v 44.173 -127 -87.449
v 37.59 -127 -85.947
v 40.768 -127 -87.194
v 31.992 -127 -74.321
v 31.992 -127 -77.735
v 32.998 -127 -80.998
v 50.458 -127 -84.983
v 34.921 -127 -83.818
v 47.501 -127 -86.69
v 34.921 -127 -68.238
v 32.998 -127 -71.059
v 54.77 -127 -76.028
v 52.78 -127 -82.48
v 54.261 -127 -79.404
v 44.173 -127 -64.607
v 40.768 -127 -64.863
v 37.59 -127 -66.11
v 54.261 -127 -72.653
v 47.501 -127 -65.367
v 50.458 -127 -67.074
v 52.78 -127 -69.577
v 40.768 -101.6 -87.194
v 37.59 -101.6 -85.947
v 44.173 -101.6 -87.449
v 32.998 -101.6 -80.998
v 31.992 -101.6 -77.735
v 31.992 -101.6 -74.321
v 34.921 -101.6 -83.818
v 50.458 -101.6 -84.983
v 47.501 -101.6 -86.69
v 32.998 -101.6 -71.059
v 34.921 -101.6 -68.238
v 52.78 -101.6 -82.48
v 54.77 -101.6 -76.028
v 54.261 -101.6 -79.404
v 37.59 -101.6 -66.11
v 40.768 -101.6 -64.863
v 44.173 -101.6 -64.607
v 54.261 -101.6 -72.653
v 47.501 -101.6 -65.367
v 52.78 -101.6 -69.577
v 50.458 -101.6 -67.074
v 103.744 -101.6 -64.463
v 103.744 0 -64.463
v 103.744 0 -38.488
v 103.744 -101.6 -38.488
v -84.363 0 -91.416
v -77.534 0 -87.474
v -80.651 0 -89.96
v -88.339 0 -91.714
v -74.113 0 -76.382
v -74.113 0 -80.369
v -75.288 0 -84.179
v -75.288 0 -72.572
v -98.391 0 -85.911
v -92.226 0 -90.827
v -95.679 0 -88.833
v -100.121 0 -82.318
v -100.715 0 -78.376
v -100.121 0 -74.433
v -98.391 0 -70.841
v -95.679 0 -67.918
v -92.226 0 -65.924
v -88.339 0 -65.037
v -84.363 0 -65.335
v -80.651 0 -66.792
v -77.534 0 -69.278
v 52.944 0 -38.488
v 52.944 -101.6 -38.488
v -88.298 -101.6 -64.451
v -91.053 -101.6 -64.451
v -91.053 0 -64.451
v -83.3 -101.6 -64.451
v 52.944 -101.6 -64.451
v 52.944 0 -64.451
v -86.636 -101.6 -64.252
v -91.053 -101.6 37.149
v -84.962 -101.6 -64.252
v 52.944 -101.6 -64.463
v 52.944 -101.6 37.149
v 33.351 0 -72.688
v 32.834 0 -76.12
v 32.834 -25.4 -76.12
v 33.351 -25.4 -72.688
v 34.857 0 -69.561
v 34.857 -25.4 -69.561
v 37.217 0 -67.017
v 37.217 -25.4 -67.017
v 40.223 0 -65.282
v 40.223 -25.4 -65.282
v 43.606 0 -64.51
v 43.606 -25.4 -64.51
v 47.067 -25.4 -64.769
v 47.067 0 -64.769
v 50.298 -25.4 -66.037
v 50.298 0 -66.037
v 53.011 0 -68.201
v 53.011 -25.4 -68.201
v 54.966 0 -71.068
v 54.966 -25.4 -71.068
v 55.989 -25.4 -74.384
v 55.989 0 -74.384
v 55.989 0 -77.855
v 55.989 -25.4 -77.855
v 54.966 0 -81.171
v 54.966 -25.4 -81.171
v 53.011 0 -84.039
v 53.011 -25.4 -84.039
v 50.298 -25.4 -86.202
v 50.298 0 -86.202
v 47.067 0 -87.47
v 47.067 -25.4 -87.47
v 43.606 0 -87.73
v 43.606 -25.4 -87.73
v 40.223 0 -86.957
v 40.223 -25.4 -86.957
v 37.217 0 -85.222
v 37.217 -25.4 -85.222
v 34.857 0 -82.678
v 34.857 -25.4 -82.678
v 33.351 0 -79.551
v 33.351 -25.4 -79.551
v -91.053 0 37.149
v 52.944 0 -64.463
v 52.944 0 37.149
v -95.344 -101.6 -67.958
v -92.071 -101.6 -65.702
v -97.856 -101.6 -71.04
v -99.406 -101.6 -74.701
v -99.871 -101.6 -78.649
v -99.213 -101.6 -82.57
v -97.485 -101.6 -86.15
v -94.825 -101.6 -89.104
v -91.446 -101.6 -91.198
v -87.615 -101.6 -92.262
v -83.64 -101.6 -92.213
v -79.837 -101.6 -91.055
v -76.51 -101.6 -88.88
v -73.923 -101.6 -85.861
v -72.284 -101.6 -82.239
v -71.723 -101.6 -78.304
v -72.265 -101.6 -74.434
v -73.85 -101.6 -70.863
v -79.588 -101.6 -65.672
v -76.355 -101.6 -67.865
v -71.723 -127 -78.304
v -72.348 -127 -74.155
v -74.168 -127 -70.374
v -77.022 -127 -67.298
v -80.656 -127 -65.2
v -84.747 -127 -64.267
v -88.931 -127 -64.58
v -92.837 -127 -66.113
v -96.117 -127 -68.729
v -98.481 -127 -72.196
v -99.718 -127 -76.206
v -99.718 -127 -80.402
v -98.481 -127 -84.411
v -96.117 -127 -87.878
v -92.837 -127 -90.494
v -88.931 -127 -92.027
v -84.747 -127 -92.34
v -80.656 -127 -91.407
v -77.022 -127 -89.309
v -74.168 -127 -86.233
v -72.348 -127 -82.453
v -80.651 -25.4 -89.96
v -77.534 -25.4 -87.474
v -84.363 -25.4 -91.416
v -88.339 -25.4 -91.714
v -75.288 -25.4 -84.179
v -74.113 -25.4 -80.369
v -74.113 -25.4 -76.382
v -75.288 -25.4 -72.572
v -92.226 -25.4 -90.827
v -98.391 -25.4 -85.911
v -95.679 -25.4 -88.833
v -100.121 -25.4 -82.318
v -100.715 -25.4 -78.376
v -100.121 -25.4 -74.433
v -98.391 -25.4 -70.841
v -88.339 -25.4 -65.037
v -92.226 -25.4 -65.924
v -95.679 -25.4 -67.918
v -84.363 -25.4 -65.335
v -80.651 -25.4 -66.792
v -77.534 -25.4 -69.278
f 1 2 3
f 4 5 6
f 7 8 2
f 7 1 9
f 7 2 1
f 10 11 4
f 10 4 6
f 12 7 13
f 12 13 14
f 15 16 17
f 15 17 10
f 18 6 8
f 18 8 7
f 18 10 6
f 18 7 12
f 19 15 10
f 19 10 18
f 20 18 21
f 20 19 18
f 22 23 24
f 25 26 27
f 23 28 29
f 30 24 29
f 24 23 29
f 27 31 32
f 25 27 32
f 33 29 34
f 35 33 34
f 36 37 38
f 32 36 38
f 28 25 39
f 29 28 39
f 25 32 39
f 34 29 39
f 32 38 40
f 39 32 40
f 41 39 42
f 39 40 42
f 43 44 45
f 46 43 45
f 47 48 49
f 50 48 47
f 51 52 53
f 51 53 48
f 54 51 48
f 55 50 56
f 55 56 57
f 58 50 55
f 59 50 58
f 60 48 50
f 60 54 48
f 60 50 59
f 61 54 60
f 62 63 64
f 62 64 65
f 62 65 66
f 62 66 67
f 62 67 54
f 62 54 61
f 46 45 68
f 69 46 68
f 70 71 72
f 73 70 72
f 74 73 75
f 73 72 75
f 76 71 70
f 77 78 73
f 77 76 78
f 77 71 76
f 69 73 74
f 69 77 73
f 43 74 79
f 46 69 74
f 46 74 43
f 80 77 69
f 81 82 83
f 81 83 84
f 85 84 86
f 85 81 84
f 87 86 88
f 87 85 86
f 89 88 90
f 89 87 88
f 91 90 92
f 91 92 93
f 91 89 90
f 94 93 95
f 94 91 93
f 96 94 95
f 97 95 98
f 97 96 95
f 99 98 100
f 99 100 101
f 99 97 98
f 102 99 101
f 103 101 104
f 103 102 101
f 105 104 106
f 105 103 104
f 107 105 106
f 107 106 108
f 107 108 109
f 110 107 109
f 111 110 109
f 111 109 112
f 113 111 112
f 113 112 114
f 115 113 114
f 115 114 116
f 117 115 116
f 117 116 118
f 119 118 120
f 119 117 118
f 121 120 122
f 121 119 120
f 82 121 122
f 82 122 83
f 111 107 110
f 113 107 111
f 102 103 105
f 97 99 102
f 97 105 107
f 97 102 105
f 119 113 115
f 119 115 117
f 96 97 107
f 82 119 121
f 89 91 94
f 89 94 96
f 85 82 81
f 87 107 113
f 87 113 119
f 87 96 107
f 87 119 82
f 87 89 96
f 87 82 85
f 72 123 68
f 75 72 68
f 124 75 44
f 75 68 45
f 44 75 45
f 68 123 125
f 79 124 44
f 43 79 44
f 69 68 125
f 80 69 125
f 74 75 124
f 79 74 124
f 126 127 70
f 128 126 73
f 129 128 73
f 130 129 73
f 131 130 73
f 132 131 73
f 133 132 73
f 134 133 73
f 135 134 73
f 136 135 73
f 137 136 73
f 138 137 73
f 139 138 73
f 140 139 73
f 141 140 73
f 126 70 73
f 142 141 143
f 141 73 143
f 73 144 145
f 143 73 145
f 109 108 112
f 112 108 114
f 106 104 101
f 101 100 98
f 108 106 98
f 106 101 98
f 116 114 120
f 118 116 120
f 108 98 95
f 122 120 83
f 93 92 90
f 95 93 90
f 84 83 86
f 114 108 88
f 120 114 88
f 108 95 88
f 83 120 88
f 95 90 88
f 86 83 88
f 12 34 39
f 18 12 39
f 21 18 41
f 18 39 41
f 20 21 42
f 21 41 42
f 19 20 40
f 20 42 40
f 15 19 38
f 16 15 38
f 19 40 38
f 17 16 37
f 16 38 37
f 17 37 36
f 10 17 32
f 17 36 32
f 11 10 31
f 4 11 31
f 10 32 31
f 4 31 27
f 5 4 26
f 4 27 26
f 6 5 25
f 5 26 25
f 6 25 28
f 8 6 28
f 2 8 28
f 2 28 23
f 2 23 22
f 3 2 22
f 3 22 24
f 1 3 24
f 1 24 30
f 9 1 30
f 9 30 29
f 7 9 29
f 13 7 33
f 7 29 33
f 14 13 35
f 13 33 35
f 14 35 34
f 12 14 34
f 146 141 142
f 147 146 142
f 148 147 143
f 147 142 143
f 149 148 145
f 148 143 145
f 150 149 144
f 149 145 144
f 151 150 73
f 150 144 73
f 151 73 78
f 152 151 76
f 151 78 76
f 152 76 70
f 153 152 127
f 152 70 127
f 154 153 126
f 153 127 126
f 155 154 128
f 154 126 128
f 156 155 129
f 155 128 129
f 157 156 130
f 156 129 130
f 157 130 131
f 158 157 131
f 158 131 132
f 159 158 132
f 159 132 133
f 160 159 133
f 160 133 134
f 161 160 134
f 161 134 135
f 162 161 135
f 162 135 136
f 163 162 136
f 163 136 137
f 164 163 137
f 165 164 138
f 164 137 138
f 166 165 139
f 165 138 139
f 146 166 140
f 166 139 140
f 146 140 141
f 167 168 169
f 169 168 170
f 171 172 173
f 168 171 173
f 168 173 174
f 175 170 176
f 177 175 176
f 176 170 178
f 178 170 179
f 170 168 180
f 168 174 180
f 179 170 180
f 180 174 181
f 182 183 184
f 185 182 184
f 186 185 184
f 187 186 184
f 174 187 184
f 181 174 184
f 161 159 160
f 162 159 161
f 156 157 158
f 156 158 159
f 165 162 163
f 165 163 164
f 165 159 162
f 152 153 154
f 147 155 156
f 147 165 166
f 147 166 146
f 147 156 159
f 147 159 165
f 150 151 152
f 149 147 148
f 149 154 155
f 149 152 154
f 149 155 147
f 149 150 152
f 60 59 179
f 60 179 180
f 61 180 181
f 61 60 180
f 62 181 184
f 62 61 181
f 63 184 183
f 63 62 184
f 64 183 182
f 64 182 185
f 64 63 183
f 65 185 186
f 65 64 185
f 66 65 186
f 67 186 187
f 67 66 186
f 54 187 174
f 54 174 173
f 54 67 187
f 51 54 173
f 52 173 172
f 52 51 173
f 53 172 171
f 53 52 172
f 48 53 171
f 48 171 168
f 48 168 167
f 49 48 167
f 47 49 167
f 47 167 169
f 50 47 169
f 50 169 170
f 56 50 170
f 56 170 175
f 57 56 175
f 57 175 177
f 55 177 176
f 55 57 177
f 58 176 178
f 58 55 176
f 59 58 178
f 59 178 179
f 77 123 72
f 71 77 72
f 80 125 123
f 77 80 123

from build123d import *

# Parameters (mm, degrees)
F1_DEPTH = 101.6
F2_W     = 37.540236
F2_H     = 32.421116
F2_W_2   = 44.555331
F2_H_2   = 31.852323
F2_W_3   = 33.748291
F2_H_3   = 32.800309
F3_DEPTH = 2.54
F4_R     = 14.07623
F4_R_2   = 11.452987
F5_DEPTH = 25.4
F6_R     = 13.375894
F6_R_2   = 11.642566
F7_DEPTH = 25.4


with BuildPart() as f1:
    # F0 (on Front) → F1 (new body)
    with BuildSketch(Plane.XZ):
        Polygon((52.943984, -38.488224), (52.943984, 37.149004), (-91.053015, 37.149004), (-91.053015, -64.450996), (52.943984, -64.450996), align=None)
        Polygon((103.743984, -38.488224), (52.943984, -38.488224), (52.943984, -64.450996), (52.943984, -64.463034), (103.743984, -64.463034), align=None)
    extrude(amount=F1_DEPTH)

    # F2 (on Front) → F3 (join)
    with BuildSketch(Plane.XZ):
        with Locations((32.320294, -21.519279)):
            Rectangle(F2_W, F2_H)
        with Locations((-8.917086, -21.614076)):
            Rectangle(F2_W_2, F2_H_2)
        with Locations((-52.050438, -22.088069)):
            Rectangle(F2_W_3, F2_H_3)
    extrude(amount=F3_DEPTH)

    # F4 (on face) → F5 (join)
    with BuildSketch(Plane.XZ.offset(101.6)):
        with Locations((-85.798733, -78.303628)):
            Circle(F4_R)
        with Locations((43.316927, -76.028459)):
            Circle(F4_R_2)
    extrude(amount=F5_DEPTH)


with BuildPart() as f7:
    # F6 (on face) → F7 (new body)
    with BuildSketch(Plane(origin=(0, 0, 0), x_dir=(-1, 0, 0), z_dir=(0, 1, 0))):
        with Locations((87.339111, -78.375705)):
            Circle(F6_R)
        with Locations((-44.476453, -76.119691)):
            Circle(F6_R_2)
    extrude(amount=-F7_DEPTH)


solid = Compound([f1.part, f7.part])
